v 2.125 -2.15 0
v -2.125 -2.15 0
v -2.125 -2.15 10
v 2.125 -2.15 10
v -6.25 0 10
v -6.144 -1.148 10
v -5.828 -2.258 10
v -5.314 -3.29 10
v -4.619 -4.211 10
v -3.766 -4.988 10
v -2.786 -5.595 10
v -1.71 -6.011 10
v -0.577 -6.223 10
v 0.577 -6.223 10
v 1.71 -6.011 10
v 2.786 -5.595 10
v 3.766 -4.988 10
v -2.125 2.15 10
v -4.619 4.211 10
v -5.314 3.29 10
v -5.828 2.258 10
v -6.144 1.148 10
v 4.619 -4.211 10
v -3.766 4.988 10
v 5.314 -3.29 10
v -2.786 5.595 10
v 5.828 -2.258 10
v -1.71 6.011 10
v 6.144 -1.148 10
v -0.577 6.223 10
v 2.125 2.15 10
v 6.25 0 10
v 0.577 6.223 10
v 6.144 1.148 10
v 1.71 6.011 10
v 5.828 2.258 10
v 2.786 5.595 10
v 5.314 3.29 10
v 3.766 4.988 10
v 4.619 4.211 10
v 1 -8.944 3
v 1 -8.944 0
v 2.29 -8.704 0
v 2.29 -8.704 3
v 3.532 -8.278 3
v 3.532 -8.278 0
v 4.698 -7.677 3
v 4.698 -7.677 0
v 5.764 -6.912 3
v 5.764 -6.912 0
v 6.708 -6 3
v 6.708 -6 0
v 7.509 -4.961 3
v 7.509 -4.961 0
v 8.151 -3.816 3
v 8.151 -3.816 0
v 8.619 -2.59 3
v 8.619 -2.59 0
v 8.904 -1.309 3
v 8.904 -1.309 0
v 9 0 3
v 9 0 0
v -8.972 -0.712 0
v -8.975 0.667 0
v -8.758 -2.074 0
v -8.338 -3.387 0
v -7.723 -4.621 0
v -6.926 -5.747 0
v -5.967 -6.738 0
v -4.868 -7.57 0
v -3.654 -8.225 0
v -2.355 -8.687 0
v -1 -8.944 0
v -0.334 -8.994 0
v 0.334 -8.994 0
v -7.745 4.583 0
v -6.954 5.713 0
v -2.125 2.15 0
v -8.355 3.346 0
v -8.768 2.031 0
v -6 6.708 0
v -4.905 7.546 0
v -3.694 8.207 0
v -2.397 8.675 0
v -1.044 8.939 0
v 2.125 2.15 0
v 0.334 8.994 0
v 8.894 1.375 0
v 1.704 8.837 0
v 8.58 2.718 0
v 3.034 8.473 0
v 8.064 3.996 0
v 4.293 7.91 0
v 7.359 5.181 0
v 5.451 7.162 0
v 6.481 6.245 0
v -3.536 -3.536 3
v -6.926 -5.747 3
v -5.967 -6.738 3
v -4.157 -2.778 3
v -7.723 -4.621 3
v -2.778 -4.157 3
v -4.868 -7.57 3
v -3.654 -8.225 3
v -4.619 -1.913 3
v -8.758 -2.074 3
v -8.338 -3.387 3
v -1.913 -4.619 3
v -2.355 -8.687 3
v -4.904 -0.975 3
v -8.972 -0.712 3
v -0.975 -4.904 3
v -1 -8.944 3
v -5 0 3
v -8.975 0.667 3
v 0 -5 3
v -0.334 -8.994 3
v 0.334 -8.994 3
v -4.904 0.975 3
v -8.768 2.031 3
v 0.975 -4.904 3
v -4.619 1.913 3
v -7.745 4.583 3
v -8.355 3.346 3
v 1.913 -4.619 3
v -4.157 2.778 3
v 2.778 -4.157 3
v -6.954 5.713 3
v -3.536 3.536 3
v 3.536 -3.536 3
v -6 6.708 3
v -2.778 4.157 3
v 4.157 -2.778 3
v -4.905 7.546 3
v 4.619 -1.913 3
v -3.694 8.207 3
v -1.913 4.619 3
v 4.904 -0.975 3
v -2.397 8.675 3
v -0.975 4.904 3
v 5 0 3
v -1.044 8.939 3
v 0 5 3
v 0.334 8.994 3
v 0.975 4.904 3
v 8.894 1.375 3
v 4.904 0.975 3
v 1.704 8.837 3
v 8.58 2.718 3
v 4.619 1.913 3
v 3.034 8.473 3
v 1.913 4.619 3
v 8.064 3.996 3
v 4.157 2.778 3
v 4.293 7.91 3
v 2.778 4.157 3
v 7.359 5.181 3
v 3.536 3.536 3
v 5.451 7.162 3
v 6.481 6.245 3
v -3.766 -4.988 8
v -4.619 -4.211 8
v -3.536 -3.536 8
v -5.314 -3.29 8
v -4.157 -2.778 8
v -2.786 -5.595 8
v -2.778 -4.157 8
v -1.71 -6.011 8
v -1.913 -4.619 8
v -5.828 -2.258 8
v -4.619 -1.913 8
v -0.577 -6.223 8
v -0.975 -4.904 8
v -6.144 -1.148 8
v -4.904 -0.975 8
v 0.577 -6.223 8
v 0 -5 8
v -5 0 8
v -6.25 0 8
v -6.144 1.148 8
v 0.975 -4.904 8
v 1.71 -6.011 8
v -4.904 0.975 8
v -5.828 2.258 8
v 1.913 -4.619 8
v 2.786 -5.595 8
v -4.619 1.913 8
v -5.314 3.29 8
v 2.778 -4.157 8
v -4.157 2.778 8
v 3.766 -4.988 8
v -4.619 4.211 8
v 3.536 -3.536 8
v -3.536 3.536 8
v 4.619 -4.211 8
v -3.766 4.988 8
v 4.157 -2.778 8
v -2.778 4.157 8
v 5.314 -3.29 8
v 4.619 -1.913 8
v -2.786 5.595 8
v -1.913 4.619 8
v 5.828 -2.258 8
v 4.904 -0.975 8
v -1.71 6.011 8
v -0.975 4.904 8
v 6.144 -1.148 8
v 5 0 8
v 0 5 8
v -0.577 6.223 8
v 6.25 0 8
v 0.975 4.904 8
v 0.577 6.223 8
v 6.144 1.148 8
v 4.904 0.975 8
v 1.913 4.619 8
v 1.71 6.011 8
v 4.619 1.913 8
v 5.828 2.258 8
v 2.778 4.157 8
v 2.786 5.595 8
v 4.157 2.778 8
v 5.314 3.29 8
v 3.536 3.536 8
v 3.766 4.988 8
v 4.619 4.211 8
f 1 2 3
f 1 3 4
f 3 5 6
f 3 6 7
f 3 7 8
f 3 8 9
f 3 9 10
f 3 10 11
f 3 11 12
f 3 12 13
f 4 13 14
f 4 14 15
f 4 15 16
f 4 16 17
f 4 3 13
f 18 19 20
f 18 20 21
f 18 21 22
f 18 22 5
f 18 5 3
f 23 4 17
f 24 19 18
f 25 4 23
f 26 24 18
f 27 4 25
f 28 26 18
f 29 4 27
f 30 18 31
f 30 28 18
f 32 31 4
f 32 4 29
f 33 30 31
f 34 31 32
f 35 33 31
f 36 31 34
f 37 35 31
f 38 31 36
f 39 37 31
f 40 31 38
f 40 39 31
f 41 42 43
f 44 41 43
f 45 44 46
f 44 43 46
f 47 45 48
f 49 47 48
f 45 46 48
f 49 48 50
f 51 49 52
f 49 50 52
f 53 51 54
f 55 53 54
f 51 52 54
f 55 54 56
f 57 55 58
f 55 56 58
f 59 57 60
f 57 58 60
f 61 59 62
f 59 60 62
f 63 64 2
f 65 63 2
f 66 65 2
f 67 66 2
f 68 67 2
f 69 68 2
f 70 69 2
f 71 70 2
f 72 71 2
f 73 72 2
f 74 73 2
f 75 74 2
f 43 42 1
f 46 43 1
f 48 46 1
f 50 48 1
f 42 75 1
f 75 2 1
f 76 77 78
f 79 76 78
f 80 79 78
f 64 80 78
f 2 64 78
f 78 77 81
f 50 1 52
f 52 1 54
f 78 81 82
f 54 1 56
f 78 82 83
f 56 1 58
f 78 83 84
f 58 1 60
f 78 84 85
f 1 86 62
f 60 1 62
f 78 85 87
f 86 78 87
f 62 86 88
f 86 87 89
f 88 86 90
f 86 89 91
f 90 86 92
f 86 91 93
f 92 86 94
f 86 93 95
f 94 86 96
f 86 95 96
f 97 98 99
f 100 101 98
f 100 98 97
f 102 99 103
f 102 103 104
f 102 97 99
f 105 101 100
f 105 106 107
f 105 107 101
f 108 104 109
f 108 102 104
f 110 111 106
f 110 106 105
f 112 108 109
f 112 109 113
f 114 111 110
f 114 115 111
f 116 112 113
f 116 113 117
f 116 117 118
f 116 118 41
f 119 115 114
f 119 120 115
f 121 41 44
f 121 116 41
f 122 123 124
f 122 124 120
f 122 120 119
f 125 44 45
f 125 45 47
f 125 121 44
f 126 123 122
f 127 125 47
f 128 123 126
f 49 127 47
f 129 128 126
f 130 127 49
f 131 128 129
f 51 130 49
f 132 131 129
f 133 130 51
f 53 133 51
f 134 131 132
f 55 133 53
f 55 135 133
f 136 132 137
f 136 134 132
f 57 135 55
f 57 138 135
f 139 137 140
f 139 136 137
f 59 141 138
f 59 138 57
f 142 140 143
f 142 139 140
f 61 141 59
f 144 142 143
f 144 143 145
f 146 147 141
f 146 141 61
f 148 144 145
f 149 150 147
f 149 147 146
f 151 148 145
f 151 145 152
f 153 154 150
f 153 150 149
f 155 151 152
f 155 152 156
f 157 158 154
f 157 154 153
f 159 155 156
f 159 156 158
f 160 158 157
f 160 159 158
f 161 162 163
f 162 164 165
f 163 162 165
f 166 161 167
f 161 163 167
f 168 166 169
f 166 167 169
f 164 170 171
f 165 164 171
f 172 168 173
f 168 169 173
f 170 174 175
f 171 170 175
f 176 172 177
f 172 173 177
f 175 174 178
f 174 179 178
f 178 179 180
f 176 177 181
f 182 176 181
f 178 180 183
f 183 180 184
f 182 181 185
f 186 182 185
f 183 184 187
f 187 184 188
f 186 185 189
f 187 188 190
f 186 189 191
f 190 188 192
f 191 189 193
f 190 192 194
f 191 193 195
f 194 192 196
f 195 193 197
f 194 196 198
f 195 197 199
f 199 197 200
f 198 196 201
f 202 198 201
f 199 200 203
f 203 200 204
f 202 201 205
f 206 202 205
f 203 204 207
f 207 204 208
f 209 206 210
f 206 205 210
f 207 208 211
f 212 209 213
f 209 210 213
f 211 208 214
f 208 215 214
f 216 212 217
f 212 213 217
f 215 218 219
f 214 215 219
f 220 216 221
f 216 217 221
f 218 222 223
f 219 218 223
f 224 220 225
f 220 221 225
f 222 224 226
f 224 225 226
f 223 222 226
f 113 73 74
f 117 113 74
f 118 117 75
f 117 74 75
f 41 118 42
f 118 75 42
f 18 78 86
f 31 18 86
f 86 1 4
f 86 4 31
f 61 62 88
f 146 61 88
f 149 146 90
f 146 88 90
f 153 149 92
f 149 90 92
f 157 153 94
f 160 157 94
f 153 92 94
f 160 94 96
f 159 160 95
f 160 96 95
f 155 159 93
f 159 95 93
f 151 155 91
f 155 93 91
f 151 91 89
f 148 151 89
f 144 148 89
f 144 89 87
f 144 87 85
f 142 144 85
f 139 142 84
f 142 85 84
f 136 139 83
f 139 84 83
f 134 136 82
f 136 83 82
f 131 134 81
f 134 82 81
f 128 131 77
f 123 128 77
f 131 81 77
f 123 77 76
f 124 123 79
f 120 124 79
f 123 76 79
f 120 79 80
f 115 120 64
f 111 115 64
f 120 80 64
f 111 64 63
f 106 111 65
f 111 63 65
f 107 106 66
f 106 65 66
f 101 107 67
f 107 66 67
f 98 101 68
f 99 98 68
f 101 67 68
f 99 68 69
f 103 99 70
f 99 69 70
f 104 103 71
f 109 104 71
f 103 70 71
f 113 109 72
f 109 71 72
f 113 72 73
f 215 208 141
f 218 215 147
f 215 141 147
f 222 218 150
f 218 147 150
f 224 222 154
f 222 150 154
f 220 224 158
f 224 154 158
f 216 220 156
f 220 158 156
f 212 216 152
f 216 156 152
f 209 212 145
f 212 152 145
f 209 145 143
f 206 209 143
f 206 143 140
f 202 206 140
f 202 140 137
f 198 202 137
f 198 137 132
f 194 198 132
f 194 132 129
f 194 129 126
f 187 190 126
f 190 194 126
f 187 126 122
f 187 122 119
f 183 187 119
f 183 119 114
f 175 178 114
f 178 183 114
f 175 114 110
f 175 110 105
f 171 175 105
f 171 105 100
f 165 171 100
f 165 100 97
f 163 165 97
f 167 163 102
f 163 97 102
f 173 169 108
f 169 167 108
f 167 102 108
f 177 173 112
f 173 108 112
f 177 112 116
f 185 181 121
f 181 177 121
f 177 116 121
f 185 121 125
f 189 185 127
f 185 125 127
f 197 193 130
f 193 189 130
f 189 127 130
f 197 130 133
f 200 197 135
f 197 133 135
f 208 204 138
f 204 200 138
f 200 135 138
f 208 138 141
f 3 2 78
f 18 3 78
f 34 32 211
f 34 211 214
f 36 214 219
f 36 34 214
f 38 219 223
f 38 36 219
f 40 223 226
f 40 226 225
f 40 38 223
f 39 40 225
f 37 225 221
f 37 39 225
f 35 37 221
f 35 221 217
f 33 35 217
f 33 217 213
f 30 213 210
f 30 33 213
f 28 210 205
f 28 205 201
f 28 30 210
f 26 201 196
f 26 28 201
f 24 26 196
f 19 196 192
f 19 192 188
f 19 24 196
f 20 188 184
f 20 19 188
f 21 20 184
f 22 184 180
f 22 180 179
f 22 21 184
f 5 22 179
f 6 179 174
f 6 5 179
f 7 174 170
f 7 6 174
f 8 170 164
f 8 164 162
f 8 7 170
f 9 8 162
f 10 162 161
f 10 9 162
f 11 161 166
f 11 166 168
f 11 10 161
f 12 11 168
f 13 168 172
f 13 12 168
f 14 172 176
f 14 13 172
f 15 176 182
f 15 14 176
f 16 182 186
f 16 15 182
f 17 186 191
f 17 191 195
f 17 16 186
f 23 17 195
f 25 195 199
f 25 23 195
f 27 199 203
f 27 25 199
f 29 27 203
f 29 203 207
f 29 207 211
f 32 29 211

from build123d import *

# Parameters (mm, degrees)
F0_R     = 5
F1_DEPTH = 3
F0_W     = 4.25
F0_H     = 4.3
F2_DEPTH = 10
F3_R     = 6.25
F3_R_2   = 5
F3_W     = 4.25
F3_H     = 4.3
F4_DEPTH = 2


with BuildPart() as f1:
    # F0 (on Top) → F1 (new body)
    with BuildSketch(Plane.XY):
        with BuildLine():
            ThreePointArc((1, -8.944272), (6.708204, -6), (9, 0))
            ThreePointArc((9, 0), (-6, 6.708204), (-1, -8.944272))
            ThreePointArc((-1, -8.944272), (0, -9), (1, -8.944272))
        make_face()
        Circle(F0_R, mode=Mode.SUBTRACT)
    extrude(amount=F1_DEPTH)

    # F0 (on Top) → F2 (join)
    with BuildSketch(Plane.XY):
        Circle(F0_R)
        Rectangle(F0_W, F0_H, mode=Mode.SUBTRACT)
    extrude(amount=F2_DEPTH)

    # F3 (on face) → F4 (join)
    with BuildSketch(Plane.XY.offset(10)):
        Circle(F3_R)
        Circle(F3_R_2, mode=Mode.SUBTRACT)
        Circle(F3_R_2)
        Rectangle(F3_W, F3_H, mode=Mode.SUBTRACT)
    extrude(amount=-F4_DEPTH)


solid = f1.part
